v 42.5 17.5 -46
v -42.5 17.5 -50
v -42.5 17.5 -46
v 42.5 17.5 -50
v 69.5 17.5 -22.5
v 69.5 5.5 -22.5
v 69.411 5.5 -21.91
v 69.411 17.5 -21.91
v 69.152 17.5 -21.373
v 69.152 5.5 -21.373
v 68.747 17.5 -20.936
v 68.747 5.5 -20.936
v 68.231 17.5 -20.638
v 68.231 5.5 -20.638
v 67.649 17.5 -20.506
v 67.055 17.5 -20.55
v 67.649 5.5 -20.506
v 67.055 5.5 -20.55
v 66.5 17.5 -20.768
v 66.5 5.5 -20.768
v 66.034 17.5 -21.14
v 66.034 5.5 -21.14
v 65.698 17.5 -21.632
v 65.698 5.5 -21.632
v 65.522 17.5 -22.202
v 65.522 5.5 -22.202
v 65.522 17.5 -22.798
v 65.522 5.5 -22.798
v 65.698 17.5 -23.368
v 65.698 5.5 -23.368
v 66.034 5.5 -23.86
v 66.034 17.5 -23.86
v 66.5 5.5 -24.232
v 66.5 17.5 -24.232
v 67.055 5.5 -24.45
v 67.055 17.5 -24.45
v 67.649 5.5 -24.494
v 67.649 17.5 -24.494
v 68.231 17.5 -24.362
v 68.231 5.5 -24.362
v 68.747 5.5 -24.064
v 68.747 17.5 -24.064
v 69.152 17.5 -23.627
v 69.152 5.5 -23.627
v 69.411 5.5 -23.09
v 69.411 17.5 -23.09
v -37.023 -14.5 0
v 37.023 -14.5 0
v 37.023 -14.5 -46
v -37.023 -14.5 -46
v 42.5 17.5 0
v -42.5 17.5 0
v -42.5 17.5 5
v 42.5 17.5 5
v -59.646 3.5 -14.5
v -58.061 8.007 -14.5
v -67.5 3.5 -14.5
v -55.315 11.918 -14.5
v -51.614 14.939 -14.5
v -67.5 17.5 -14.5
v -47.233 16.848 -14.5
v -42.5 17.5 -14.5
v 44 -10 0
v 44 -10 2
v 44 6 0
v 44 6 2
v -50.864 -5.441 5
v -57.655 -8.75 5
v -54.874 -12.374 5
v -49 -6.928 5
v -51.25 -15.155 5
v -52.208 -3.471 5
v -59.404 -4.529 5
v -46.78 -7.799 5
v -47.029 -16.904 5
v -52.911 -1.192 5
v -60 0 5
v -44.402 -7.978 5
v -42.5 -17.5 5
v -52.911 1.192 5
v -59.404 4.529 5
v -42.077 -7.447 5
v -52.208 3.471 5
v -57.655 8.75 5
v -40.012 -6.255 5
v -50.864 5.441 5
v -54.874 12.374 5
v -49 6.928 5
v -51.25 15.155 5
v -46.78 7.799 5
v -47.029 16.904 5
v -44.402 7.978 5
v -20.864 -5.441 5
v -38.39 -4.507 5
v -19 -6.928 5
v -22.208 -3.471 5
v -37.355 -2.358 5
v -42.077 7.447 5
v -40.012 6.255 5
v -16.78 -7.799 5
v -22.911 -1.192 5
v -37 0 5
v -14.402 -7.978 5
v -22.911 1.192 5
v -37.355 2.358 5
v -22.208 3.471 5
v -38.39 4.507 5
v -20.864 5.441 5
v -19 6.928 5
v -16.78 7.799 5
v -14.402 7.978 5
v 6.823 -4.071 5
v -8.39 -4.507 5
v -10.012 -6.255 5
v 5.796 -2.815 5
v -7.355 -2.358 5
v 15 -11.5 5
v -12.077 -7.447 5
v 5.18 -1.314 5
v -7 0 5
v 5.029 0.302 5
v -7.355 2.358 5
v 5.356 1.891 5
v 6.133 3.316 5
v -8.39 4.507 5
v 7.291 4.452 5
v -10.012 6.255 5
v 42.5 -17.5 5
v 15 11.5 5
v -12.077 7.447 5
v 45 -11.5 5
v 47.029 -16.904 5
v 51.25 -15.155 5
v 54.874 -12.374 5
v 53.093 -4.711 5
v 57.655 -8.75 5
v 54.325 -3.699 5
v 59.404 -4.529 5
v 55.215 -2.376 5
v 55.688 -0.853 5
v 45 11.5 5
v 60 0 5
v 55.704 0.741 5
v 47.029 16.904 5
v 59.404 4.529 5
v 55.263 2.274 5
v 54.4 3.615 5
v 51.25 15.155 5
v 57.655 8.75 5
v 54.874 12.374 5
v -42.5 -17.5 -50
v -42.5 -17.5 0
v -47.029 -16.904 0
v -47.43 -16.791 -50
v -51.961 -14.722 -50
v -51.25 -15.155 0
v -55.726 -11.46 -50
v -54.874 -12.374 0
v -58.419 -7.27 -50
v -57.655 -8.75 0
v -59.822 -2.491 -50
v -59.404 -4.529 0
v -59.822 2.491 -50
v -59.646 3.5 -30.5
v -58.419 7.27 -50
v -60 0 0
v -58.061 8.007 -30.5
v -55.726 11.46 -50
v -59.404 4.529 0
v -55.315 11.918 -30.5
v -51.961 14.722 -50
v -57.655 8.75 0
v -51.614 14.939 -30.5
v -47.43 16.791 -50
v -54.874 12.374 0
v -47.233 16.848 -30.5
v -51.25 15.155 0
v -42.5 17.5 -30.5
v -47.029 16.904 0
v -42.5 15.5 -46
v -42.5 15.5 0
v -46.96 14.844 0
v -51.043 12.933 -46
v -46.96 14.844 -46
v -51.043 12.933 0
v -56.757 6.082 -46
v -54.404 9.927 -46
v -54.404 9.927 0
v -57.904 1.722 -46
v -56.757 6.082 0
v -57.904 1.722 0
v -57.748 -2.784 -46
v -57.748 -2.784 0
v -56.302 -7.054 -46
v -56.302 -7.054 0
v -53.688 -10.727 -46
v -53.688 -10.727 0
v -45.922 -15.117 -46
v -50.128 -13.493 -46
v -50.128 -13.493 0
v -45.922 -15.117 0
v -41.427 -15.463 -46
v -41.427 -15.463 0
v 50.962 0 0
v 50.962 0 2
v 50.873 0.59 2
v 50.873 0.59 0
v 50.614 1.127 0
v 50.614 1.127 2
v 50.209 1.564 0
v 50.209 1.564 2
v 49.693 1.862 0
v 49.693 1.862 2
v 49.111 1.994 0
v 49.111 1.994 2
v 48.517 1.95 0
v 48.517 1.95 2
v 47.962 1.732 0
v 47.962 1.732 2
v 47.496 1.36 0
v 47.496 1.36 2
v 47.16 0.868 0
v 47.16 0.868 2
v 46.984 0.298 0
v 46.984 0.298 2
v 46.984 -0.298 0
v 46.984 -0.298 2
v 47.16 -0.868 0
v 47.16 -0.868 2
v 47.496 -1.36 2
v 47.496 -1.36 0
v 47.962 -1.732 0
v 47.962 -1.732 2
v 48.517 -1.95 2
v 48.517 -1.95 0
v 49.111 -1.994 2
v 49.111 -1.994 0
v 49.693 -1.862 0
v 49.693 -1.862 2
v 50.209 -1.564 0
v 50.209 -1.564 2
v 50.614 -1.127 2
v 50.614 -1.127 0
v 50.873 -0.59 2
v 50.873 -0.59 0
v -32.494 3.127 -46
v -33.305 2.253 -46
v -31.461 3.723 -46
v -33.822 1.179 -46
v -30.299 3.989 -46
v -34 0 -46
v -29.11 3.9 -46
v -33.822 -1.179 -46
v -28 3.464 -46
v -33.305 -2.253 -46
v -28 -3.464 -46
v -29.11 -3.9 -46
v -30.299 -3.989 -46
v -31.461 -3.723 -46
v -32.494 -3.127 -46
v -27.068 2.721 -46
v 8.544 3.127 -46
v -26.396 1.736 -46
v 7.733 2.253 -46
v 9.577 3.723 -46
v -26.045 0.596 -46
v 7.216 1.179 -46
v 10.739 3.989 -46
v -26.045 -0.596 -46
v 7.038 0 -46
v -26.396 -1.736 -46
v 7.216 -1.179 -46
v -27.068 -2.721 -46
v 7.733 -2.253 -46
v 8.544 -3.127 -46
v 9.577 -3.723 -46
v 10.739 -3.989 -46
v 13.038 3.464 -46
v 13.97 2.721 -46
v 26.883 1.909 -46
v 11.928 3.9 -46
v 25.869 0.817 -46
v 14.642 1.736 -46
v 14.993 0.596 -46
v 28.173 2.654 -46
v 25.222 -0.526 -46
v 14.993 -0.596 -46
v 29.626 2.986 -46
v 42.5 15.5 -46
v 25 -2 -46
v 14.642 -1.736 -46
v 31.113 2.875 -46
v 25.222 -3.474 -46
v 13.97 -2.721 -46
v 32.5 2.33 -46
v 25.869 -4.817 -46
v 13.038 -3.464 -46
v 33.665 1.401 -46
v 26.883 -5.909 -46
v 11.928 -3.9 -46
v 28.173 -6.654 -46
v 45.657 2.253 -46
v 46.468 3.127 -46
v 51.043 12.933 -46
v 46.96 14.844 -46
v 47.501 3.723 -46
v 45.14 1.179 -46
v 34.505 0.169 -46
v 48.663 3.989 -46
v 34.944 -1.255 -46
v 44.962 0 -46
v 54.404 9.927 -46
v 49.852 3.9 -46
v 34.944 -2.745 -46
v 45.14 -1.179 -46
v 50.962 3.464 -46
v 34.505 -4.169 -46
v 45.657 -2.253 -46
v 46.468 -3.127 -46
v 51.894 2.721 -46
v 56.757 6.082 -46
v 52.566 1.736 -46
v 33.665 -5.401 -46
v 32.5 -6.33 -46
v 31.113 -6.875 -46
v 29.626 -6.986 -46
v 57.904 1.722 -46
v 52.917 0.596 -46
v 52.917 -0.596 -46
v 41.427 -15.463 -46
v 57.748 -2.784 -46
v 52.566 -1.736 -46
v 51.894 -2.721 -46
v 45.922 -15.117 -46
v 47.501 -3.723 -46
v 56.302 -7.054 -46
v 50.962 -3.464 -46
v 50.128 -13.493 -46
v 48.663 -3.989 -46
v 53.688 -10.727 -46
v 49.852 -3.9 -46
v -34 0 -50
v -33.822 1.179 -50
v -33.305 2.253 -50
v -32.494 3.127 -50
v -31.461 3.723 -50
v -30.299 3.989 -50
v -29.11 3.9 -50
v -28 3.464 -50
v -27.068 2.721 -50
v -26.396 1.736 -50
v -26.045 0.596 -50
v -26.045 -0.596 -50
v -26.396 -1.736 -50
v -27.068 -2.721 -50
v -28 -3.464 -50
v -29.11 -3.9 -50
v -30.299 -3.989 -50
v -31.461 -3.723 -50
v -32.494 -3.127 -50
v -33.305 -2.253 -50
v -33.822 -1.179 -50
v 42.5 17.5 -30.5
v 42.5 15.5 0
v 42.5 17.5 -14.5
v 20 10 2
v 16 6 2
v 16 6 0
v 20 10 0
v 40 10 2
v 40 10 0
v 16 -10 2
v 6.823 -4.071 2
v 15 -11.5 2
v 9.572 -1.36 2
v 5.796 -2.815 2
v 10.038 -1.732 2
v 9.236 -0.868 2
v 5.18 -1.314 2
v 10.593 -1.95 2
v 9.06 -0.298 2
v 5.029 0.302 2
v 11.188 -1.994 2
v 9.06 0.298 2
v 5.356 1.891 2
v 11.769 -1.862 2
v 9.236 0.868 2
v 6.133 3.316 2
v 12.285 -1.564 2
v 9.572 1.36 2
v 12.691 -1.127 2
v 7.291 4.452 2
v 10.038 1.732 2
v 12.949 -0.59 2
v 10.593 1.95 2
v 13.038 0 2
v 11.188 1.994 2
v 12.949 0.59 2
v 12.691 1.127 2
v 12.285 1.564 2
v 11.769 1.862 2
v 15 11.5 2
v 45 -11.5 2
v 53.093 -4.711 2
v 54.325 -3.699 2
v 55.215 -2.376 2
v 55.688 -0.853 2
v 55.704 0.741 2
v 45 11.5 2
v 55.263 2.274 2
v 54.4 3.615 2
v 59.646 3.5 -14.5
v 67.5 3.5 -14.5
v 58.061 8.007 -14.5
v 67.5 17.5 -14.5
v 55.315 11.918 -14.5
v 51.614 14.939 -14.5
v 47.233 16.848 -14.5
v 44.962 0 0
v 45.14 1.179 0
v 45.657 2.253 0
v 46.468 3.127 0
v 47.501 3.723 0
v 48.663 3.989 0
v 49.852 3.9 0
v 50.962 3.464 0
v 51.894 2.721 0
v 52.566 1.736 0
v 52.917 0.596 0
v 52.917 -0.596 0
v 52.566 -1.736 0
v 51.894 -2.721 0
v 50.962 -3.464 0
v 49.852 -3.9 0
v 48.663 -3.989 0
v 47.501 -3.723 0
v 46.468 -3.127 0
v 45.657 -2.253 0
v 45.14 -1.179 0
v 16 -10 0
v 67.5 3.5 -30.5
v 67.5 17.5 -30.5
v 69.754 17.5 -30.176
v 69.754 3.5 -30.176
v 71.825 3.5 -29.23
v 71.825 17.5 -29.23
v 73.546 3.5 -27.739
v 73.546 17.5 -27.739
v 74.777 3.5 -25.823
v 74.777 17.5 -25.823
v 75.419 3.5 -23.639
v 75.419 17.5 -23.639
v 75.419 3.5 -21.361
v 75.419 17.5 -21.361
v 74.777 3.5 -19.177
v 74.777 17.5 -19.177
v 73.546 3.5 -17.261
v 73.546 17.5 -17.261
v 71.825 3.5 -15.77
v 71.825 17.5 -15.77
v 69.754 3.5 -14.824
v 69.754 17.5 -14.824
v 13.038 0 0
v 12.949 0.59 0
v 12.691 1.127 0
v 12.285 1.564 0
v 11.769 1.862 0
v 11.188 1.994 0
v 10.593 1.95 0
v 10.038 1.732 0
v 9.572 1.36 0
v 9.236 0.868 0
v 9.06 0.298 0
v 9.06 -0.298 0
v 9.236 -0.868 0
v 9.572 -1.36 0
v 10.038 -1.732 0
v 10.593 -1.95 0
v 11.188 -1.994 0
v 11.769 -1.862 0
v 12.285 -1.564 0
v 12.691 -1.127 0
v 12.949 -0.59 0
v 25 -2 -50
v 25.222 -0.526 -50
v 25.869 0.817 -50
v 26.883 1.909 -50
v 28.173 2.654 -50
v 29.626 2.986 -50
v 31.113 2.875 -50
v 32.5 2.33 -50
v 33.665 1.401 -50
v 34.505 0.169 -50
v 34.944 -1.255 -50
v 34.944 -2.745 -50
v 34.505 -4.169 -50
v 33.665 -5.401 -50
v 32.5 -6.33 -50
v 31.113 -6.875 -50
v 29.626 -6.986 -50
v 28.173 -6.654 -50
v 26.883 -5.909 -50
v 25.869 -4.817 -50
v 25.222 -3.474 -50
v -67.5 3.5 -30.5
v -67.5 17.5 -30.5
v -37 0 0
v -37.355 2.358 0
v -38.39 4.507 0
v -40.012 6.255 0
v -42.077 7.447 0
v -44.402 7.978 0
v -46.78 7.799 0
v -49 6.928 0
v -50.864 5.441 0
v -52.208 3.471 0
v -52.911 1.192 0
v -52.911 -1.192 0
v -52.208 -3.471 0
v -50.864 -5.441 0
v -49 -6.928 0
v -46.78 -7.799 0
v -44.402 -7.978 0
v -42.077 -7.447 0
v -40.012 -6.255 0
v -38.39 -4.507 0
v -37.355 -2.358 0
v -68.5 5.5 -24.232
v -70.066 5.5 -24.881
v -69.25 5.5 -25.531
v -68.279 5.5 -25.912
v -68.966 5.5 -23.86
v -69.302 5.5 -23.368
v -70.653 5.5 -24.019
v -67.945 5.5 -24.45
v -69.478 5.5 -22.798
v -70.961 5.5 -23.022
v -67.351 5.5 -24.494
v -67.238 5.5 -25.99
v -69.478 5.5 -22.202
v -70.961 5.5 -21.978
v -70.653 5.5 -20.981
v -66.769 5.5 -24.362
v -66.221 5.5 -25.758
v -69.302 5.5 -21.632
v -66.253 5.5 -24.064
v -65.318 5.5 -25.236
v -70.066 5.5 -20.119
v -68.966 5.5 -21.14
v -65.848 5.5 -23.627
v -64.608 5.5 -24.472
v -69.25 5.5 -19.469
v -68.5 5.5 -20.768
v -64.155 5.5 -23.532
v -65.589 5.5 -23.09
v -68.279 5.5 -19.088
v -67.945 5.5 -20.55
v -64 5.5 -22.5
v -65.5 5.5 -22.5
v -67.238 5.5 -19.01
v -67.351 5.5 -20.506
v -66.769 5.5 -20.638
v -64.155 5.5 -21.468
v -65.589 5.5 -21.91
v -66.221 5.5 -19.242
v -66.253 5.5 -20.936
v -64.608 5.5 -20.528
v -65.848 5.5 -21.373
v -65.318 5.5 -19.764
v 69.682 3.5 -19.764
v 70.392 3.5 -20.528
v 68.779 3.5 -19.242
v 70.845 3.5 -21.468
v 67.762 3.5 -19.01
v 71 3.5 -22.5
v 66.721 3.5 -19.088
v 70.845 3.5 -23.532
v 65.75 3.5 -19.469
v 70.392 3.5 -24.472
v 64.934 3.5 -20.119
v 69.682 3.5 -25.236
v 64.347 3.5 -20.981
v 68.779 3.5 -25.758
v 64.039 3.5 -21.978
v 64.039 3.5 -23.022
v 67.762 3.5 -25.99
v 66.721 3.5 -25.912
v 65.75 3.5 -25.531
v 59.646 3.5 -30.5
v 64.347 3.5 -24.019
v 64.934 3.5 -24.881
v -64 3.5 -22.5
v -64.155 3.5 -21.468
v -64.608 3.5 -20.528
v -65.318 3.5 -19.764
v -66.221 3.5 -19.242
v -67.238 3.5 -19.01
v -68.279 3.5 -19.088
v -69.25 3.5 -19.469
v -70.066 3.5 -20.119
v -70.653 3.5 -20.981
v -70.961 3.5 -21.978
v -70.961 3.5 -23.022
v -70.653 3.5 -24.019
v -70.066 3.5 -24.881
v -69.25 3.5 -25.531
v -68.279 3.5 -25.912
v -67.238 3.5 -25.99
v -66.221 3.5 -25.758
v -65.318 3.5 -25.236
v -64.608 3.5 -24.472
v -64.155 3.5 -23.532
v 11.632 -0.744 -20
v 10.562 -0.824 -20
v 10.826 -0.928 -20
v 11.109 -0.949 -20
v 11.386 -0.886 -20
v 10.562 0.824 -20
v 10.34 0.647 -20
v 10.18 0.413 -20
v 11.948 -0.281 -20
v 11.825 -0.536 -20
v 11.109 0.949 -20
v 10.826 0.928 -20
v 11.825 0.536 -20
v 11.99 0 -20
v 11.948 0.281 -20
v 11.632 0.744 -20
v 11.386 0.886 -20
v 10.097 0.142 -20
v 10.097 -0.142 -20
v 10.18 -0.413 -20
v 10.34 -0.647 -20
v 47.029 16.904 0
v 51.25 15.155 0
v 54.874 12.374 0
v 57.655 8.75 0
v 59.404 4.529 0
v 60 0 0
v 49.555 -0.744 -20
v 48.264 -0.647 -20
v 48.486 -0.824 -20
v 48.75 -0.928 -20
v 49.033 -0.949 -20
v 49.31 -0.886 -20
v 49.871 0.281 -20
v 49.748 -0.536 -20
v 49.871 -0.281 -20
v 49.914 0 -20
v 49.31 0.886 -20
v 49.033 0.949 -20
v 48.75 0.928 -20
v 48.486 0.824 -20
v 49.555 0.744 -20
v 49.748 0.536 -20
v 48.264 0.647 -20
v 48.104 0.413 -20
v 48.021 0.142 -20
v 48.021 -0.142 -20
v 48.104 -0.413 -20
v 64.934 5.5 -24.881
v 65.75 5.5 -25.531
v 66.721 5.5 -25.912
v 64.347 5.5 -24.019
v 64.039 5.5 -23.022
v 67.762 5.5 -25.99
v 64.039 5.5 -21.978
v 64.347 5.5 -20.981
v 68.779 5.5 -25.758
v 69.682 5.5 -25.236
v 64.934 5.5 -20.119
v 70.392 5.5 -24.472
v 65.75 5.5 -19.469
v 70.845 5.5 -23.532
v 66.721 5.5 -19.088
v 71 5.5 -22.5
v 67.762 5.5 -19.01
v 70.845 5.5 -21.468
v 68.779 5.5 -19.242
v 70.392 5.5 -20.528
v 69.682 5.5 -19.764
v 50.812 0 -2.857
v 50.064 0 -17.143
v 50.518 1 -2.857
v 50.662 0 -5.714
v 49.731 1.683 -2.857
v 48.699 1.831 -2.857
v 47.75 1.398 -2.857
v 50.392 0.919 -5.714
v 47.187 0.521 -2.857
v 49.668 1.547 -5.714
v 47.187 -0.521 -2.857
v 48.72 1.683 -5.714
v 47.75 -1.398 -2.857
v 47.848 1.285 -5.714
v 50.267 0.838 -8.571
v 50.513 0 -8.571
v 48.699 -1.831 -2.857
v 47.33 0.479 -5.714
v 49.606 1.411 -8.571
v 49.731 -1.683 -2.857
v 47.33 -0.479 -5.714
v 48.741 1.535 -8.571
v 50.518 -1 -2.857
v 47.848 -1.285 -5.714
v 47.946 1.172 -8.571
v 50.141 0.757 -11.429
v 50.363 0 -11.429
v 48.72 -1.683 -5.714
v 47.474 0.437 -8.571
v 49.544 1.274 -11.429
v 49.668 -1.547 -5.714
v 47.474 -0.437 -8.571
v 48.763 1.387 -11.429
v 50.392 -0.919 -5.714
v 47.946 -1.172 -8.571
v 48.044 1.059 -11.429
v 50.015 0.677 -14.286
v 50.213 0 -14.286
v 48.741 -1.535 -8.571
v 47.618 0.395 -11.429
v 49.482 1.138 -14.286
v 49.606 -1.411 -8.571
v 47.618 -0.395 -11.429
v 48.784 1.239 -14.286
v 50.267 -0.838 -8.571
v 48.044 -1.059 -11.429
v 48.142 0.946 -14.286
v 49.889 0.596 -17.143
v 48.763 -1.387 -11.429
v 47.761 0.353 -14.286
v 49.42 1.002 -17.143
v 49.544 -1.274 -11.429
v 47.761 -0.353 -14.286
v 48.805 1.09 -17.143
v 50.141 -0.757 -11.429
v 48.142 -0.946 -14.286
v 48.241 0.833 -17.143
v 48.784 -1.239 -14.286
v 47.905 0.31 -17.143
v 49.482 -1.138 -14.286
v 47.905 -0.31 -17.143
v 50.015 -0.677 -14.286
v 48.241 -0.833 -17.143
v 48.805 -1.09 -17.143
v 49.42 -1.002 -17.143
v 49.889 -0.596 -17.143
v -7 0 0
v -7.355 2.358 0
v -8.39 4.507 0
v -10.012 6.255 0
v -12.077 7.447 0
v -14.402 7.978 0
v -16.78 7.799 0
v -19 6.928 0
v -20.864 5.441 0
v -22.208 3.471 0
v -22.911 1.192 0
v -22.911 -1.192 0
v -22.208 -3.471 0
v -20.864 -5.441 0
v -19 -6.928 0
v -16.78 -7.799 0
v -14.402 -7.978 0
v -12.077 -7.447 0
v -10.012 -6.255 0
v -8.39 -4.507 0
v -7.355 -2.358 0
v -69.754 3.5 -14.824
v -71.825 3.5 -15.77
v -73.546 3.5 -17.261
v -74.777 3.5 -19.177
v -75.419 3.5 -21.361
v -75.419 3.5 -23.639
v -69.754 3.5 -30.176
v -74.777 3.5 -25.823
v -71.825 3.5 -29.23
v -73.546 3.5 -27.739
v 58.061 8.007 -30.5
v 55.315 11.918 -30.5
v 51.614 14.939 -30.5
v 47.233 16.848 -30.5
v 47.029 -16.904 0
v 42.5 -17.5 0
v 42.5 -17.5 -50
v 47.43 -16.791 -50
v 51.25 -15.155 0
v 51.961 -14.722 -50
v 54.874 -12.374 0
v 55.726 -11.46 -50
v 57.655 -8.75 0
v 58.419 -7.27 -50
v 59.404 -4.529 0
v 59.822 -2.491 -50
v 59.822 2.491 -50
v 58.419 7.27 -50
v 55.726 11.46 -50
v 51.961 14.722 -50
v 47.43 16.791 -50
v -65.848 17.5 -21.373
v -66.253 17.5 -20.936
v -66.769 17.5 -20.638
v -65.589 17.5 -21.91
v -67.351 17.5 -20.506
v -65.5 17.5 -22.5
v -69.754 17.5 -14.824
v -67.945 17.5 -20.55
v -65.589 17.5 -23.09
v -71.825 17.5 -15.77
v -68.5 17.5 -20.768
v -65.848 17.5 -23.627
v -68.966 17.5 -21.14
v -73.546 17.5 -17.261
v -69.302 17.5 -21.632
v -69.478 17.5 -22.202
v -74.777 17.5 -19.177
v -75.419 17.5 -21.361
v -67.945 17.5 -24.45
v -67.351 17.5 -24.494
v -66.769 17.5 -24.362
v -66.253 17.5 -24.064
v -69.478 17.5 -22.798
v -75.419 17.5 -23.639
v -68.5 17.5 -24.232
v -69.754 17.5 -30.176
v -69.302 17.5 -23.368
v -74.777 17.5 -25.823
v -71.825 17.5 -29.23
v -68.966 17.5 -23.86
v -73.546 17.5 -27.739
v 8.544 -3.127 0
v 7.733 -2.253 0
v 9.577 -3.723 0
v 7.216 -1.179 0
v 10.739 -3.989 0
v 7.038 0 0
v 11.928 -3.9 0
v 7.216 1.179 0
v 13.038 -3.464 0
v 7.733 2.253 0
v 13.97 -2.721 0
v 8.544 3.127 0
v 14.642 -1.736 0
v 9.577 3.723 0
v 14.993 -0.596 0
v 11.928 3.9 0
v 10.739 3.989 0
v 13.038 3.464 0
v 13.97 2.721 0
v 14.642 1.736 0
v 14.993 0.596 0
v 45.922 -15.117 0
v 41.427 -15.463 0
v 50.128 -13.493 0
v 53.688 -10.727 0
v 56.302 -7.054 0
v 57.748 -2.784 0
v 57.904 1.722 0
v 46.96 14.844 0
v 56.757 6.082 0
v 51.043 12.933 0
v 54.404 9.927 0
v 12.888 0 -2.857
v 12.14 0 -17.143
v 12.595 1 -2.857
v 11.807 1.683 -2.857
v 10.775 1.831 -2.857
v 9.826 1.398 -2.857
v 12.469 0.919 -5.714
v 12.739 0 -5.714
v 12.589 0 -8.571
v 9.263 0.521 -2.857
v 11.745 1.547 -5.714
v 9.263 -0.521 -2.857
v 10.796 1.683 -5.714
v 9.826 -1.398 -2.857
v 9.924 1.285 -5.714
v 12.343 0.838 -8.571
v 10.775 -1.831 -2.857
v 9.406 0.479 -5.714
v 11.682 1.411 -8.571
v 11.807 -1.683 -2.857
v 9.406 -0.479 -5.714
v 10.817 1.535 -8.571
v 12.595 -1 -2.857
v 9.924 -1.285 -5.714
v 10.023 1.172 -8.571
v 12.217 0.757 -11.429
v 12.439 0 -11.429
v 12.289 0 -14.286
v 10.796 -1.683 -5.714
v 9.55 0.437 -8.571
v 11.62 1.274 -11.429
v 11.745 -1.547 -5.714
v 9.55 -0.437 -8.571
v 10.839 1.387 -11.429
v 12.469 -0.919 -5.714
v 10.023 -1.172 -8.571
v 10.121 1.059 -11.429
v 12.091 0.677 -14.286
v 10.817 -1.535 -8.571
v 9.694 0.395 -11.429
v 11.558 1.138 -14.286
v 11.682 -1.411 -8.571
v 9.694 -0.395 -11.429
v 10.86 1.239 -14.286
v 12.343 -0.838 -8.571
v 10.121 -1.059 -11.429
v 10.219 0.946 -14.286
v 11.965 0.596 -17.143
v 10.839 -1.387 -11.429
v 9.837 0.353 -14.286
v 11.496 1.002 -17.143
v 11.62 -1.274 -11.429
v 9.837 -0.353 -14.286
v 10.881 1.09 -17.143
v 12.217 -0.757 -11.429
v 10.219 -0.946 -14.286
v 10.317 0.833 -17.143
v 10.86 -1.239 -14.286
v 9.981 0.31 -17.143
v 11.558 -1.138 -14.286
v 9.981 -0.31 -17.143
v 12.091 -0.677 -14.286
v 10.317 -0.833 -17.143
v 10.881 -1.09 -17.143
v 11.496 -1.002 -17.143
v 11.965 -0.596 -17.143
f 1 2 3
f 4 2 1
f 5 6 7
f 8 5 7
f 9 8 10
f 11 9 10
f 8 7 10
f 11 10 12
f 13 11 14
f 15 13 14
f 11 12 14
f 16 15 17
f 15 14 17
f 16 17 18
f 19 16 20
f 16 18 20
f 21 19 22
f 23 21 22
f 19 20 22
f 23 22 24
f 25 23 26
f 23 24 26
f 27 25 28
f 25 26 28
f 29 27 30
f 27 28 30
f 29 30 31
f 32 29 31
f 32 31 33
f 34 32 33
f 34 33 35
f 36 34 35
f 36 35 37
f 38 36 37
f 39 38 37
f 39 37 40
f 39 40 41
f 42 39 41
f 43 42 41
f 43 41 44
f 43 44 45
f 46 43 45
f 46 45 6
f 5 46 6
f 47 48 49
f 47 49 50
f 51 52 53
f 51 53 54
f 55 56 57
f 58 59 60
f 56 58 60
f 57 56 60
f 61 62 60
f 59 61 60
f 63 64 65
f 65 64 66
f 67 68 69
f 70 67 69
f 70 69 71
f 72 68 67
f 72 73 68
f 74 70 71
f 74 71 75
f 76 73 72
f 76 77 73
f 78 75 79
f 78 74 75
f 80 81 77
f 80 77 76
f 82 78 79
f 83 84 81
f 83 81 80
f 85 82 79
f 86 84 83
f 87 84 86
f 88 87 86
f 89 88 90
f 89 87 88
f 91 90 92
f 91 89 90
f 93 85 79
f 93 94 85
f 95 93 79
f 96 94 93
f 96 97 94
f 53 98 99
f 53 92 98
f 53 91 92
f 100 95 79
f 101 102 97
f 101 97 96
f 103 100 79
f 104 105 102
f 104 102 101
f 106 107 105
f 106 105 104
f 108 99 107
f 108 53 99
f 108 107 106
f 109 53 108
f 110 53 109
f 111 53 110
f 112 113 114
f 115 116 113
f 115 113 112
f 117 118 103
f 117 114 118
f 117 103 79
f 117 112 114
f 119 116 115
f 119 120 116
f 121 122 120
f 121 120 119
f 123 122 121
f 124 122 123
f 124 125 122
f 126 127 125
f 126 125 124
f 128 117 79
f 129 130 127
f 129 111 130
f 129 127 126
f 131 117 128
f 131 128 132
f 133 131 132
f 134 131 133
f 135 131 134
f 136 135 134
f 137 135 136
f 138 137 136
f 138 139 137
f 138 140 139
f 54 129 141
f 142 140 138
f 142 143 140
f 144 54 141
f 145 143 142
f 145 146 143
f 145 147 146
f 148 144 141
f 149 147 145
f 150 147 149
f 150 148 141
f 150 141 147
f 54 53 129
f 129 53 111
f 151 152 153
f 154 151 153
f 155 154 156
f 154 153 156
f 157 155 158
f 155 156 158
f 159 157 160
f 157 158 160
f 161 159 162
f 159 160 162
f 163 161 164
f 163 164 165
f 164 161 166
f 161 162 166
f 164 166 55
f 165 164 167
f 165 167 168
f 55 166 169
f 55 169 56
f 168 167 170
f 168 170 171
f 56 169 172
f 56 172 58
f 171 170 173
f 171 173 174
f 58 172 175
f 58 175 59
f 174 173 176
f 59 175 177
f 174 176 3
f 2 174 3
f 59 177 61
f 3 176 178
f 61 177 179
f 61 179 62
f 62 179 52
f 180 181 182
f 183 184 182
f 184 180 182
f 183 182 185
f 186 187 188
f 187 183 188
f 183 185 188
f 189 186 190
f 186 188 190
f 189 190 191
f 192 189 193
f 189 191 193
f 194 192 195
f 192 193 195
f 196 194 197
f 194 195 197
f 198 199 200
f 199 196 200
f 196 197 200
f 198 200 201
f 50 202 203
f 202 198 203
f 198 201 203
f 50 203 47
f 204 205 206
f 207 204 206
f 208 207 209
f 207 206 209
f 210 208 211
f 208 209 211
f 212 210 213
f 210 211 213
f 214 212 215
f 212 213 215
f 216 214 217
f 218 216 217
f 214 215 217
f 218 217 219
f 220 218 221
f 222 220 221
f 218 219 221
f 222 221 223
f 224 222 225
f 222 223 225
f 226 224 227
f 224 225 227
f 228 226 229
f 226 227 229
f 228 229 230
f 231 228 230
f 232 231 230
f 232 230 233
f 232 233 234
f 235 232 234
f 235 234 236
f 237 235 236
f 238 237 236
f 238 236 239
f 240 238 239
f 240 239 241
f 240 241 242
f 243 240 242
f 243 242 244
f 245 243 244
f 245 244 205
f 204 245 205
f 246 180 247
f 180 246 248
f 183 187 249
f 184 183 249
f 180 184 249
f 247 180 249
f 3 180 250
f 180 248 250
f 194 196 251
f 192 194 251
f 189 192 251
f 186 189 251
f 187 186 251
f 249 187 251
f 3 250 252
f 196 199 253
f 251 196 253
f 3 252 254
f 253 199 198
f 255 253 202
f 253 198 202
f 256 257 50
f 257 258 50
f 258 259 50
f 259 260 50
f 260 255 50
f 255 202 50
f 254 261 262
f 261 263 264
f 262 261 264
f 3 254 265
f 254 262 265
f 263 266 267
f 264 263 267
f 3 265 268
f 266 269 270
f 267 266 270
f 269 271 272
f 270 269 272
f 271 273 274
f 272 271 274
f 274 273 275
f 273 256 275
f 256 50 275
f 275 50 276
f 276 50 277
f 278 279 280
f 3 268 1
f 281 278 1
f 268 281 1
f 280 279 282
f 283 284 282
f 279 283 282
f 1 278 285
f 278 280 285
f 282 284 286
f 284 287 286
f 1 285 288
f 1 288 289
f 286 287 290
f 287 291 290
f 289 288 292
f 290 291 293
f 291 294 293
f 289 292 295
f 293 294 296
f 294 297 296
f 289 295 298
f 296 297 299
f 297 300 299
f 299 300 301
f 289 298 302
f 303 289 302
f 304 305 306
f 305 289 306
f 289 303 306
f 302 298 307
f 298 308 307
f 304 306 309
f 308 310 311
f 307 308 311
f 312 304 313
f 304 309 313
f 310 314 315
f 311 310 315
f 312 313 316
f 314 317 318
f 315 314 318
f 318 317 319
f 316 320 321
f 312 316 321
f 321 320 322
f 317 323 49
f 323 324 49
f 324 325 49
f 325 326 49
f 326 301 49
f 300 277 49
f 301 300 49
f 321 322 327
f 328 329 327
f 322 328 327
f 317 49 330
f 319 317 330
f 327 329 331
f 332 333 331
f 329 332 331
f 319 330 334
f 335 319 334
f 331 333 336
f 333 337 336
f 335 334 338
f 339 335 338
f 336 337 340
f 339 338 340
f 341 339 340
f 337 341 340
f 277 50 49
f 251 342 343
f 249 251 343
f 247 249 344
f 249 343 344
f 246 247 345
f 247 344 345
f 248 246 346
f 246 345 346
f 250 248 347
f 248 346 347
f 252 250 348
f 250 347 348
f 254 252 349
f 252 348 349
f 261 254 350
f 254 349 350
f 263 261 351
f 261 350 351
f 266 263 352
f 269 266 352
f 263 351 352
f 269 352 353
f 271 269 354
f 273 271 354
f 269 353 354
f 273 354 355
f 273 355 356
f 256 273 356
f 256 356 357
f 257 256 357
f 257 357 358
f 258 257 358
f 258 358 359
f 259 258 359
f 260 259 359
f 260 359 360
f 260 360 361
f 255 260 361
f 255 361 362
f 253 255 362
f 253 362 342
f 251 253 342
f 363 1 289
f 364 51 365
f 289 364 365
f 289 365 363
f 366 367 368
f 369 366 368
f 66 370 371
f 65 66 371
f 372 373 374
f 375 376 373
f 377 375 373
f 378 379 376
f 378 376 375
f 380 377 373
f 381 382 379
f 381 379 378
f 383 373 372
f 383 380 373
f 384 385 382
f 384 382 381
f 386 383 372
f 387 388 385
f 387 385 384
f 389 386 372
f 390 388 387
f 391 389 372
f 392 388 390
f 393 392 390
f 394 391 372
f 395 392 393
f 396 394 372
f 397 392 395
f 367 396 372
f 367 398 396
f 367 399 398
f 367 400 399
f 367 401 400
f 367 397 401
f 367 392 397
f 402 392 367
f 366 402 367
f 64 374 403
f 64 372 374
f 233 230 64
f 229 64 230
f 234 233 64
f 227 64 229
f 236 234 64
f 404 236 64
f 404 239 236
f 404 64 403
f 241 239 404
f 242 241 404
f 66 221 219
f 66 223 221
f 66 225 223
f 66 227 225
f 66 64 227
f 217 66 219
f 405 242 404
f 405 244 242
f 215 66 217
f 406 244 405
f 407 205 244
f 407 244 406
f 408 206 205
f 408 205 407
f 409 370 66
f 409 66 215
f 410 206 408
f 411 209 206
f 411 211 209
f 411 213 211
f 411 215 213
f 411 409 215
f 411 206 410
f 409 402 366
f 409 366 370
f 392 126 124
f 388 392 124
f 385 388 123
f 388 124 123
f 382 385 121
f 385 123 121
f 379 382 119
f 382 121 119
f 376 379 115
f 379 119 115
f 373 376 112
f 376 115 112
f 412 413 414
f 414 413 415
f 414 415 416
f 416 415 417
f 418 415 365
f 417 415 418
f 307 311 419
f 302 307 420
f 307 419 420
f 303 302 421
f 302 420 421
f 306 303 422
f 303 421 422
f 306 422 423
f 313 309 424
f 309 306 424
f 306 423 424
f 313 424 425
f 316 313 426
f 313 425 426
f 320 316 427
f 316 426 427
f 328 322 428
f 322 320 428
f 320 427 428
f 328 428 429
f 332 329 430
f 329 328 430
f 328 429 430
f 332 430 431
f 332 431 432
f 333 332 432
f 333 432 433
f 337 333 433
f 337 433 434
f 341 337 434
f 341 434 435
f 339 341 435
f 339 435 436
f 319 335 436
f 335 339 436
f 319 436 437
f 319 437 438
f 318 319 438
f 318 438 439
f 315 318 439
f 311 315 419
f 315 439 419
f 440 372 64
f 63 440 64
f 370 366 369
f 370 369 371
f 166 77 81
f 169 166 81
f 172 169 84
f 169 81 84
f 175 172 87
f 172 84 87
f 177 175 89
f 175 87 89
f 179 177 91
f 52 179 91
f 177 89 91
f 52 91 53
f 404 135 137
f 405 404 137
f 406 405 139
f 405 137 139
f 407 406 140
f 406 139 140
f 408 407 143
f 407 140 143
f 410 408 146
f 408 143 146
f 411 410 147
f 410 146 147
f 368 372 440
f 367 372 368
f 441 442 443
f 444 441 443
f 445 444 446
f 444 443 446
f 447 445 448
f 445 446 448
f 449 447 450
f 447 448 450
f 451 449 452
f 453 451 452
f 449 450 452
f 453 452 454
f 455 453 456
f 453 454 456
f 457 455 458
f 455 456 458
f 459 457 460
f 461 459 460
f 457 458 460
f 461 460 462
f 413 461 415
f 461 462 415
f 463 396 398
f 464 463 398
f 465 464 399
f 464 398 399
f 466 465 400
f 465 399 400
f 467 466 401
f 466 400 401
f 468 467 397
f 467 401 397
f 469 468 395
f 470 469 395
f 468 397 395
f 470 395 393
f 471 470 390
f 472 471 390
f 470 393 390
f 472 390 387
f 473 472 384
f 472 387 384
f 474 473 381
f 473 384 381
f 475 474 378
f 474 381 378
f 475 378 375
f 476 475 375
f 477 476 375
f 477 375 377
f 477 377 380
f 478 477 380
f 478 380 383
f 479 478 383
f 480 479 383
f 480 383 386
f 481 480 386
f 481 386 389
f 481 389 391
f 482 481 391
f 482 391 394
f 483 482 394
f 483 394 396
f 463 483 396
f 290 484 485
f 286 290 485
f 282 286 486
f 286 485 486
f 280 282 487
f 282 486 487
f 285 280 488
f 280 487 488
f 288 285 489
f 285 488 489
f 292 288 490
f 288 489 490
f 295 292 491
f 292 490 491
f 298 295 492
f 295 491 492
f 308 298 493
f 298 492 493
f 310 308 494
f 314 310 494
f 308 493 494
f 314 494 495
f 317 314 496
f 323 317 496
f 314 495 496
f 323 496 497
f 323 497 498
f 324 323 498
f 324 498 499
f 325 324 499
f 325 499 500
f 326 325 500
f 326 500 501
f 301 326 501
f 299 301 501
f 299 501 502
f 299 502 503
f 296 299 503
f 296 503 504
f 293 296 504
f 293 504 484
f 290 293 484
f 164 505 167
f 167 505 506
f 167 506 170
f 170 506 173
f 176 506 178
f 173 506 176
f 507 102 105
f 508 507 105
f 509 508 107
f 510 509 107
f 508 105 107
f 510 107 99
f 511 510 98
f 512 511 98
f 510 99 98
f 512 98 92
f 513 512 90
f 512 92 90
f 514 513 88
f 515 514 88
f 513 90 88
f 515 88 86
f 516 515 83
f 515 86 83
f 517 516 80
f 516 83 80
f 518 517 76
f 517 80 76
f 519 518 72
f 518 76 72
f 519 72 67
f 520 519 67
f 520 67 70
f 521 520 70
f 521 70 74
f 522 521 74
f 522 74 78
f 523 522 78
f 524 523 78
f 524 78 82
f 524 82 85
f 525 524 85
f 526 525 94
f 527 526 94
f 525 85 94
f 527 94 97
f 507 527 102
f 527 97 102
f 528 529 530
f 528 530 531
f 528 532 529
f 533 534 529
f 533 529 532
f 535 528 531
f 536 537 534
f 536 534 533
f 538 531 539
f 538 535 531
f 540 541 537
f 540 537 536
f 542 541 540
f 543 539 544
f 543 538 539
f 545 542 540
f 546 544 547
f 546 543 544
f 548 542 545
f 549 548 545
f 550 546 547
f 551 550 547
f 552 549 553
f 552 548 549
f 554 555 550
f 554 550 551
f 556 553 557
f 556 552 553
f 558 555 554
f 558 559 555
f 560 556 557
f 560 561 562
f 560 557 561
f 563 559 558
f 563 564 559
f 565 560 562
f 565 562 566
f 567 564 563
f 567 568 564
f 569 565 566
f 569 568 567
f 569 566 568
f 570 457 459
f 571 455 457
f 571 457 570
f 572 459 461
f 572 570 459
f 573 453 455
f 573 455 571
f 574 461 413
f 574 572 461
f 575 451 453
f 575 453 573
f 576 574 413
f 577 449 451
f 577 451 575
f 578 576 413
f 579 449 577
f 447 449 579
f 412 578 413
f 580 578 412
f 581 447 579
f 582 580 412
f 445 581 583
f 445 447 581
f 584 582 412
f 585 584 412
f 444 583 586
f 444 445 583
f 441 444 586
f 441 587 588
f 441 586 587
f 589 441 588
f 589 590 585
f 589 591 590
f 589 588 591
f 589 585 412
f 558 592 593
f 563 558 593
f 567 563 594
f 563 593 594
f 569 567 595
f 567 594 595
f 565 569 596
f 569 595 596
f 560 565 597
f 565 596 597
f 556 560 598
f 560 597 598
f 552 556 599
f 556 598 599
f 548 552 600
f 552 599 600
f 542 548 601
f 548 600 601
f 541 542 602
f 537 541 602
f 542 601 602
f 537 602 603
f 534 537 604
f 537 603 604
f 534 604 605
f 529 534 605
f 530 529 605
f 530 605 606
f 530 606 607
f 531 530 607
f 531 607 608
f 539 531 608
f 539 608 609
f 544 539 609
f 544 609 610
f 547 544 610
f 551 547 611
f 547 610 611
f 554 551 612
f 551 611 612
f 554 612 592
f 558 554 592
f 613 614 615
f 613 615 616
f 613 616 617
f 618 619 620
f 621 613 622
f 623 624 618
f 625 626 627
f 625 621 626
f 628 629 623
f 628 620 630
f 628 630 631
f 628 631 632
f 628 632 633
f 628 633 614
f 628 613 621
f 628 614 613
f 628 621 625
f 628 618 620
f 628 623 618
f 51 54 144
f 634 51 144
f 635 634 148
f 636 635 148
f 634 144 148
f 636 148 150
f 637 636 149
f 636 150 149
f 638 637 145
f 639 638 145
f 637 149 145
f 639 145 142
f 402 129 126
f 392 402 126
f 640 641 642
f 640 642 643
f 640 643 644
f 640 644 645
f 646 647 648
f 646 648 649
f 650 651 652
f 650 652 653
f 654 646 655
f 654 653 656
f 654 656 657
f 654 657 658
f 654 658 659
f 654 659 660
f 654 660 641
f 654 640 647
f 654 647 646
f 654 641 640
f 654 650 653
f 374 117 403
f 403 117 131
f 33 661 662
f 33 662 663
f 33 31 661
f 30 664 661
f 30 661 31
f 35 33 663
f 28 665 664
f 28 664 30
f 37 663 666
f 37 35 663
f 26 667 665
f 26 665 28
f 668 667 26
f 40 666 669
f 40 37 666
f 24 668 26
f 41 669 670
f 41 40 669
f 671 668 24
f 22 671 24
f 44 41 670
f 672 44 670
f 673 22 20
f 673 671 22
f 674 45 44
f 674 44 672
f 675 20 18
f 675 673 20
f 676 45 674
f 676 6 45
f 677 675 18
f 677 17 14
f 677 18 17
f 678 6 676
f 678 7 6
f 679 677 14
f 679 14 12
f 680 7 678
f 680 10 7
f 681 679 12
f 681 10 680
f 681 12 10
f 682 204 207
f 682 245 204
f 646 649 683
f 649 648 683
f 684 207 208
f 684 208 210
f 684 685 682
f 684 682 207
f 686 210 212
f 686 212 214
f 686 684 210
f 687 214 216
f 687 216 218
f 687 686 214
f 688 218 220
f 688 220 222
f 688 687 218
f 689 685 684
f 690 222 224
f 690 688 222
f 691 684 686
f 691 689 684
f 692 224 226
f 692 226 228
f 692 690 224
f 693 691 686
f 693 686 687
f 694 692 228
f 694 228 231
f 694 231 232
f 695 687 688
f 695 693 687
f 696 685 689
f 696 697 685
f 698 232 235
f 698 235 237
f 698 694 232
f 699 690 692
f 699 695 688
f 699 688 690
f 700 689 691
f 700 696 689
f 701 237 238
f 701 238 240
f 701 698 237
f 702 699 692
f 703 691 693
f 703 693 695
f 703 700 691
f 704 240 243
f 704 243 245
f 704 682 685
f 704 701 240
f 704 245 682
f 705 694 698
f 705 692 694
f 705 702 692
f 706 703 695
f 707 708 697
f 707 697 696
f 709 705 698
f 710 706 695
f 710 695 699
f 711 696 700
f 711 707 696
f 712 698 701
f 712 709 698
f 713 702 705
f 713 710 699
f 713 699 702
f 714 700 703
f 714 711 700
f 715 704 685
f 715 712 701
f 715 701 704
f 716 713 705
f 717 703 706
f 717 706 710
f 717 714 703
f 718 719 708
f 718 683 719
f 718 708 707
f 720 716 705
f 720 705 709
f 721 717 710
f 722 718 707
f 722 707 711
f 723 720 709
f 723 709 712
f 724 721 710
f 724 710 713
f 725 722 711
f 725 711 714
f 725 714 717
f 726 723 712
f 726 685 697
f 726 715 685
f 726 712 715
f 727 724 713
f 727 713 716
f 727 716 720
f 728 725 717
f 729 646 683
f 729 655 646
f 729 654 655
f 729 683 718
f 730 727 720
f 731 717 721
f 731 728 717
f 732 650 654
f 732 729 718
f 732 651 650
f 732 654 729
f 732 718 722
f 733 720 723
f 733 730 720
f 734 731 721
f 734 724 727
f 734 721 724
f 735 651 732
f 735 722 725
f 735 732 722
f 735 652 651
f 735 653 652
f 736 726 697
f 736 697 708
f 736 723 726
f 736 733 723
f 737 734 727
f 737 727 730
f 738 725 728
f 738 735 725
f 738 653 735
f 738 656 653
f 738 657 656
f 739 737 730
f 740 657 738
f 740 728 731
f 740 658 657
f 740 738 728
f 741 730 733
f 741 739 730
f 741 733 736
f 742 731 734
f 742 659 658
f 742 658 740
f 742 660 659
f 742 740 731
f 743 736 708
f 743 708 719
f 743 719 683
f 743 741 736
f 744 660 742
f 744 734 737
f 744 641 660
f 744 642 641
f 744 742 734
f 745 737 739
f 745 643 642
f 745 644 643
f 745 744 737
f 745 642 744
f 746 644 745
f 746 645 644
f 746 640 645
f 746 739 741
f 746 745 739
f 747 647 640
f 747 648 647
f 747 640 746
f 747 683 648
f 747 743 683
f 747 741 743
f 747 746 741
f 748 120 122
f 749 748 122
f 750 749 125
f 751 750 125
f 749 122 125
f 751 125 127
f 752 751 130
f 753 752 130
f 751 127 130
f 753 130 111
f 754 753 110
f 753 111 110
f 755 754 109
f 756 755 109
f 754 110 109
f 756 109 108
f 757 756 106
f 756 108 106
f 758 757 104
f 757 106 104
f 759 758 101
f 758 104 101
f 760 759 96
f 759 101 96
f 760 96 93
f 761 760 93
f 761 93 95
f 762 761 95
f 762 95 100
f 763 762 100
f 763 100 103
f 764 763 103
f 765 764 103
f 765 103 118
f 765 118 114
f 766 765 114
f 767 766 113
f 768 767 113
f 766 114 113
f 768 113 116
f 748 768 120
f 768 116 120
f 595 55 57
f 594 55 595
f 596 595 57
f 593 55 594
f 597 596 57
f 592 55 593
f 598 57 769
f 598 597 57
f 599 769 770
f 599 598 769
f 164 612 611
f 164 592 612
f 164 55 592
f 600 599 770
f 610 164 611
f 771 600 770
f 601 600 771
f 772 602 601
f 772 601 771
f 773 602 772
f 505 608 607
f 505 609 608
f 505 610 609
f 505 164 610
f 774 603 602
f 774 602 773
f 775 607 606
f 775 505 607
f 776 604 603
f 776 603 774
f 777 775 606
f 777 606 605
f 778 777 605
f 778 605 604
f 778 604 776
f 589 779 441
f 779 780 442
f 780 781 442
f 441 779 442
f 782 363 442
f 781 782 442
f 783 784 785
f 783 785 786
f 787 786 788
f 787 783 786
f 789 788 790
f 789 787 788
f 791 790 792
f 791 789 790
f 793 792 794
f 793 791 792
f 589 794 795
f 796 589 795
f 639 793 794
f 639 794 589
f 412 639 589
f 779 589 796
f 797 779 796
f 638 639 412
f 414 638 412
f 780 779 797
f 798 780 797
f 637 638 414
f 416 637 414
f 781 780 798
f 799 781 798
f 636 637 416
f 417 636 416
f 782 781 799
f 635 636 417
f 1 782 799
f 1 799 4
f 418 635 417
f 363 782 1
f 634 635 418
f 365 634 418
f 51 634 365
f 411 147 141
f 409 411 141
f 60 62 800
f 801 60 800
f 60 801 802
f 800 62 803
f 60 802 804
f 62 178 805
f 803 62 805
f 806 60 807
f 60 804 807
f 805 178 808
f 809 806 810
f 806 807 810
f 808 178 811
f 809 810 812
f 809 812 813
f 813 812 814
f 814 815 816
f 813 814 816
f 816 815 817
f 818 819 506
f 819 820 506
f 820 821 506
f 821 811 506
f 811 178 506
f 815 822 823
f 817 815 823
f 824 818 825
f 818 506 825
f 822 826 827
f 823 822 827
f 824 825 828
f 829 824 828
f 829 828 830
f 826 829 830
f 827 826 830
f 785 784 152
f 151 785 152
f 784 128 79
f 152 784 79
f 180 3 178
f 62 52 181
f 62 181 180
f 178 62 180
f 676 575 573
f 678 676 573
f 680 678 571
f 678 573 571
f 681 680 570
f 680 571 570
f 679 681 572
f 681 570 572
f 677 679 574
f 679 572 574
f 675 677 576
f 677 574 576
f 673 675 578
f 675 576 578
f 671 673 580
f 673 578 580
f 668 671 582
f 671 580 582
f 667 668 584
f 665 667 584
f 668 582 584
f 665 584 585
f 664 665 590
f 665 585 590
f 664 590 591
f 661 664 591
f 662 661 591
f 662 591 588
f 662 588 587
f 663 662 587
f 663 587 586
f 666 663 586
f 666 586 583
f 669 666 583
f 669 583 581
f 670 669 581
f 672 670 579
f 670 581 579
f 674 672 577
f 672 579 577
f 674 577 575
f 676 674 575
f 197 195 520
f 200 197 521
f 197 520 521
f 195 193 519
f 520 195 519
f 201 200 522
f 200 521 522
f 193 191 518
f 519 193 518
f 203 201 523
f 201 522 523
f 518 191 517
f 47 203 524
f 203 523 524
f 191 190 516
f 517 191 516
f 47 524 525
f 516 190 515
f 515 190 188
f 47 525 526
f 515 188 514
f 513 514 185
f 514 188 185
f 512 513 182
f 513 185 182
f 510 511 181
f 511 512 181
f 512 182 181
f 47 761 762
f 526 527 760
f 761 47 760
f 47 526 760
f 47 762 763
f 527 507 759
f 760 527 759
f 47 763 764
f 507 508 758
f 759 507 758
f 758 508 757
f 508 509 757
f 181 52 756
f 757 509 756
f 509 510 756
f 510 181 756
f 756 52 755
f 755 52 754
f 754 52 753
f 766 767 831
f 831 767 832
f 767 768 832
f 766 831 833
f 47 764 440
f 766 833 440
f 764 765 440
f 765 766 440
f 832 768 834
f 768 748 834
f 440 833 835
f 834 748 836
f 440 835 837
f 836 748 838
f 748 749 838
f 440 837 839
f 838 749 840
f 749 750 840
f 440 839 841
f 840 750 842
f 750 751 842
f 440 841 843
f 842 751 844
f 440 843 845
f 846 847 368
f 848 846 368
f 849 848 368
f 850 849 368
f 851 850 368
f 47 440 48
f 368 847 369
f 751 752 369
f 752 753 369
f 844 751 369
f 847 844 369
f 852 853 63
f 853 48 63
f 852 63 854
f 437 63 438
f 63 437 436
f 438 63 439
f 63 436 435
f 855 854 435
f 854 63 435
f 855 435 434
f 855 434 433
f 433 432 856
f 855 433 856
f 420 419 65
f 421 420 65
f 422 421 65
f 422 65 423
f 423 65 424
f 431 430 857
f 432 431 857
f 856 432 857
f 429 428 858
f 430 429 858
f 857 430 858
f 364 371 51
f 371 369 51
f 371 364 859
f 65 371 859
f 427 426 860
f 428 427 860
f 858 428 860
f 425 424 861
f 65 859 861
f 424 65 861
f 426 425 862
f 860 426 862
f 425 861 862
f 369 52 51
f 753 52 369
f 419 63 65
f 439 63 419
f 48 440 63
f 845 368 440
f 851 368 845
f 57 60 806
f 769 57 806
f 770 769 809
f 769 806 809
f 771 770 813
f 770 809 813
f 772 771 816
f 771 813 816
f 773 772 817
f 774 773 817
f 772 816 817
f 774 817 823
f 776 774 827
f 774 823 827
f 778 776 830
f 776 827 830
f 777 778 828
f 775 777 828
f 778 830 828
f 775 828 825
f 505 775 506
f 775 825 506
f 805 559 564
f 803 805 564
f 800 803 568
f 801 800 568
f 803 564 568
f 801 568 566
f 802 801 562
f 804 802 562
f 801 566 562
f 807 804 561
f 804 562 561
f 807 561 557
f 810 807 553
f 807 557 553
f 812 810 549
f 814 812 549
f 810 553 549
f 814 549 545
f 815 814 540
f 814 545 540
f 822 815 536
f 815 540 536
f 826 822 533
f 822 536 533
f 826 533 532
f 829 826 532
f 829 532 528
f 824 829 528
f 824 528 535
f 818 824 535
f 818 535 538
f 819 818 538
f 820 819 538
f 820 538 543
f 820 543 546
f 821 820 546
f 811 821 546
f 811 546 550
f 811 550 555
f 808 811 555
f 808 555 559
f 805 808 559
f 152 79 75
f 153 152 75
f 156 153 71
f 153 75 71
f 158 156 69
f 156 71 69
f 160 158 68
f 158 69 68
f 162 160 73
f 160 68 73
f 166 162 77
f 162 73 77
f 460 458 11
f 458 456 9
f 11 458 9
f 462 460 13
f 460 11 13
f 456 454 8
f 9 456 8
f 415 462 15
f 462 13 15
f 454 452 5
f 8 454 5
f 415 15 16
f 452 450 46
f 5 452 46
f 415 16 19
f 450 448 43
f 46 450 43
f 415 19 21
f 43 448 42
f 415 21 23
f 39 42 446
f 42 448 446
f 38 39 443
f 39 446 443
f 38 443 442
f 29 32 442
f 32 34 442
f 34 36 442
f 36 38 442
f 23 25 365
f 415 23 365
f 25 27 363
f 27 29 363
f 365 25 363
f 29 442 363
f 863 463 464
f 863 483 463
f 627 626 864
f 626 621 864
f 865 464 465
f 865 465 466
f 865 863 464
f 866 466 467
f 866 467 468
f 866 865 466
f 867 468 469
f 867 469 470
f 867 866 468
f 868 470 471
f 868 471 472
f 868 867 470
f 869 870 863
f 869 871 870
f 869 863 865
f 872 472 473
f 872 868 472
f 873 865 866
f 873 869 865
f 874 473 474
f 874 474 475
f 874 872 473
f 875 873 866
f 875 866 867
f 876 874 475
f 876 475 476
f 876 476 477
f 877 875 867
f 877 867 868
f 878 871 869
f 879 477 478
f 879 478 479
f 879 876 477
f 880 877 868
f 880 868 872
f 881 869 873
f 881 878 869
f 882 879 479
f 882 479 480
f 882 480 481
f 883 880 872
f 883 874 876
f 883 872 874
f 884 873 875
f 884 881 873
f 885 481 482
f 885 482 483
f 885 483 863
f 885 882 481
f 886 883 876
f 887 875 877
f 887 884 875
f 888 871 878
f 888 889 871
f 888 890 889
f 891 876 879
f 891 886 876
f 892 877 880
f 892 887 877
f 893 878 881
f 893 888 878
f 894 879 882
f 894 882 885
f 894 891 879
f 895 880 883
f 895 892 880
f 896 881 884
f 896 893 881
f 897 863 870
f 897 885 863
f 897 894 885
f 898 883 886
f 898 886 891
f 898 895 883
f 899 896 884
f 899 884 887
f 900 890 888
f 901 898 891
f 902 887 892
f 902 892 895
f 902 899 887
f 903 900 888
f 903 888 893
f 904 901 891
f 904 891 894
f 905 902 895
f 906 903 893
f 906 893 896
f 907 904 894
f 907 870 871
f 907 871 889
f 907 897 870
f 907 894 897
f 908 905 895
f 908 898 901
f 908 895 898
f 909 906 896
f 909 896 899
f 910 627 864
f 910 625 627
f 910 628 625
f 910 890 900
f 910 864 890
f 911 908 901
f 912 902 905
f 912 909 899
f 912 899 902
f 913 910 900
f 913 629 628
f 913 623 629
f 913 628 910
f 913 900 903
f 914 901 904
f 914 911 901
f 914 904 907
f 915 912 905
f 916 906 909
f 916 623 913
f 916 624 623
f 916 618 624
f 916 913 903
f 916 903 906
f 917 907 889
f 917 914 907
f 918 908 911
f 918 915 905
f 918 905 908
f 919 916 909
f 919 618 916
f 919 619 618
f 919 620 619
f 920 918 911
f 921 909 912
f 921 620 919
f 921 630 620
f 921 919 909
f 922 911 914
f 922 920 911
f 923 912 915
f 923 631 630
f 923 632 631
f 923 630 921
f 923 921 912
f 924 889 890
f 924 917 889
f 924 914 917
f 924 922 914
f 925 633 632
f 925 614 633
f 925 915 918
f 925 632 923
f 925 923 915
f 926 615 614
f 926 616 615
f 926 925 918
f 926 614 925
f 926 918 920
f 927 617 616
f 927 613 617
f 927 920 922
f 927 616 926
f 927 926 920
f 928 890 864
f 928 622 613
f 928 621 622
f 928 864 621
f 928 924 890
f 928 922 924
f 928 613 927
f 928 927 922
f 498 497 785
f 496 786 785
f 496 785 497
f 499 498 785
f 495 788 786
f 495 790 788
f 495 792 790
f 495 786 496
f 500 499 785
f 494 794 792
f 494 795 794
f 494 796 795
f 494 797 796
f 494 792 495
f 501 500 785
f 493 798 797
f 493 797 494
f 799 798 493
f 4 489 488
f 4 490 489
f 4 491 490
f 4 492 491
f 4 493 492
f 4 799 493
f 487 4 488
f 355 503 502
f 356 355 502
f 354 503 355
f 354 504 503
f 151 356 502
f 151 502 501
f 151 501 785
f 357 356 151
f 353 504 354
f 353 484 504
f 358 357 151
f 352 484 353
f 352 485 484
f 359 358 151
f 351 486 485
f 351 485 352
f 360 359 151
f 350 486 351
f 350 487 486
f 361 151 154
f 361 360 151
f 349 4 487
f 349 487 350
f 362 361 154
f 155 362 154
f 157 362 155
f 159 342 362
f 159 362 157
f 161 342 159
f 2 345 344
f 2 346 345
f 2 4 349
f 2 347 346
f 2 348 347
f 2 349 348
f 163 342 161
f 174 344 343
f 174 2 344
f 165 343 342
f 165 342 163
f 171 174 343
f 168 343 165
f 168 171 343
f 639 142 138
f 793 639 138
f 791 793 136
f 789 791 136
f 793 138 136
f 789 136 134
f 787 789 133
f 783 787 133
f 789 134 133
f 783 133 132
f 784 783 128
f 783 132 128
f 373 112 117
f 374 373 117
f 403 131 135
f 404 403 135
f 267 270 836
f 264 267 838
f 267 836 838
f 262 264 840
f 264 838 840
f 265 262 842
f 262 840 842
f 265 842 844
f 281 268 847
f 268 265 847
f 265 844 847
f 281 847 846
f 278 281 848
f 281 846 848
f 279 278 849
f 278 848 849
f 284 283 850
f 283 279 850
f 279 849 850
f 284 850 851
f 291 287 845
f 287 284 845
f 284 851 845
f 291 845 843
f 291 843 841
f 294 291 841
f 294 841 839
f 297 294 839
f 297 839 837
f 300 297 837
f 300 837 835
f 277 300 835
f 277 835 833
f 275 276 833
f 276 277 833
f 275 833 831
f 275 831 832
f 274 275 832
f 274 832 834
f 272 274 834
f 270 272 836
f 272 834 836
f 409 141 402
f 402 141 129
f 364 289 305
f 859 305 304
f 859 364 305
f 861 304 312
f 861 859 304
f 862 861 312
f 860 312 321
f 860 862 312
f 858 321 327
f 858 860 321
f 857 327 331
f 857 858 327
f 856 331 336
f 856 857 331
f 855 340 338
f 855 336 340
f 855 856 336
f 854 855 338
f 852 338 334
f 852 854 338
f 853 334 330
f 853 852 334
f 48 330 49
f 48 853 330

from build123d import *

# Parameters (mm, degrees)
SKETCH1_W           = 120
SKETCH1_H           = 35
BOSS_EXTRUDE1_DEPTH = 5
CUT_EXTRUDE1_DEPTH  = 3
SKETCH5_W           = 28
SKETCH5_H           = 20
CUT_EXTRUDE2_DEPTH  = 3
CHAMFER1_SIZE       = 4
SKETCH6_R           = 8
CUT_EXTRUDE3_DEPTH  = 5
SKETCH7_R           = 2
CUT_EXTRUDE4_DEPTH  = 5
CUT_EXTRUDE5_DEPTH  = 5
SKETCH9_W           = 85
SKETCH9_H           = 3
BOSS_EXTRUDE2_DEPTH = 50
SKETCH10_W          = 85
SKETCH10_H          = 4
BOSS_EXTRUDE3_DEPTH = 32
BOSS_EXTRUDE4_DEPTH = 50
SKETCH12_R          = 17.5
BOSS_EXTRUDE5_DEPTH = 4
SKETCH13_R          = 5
SKETCH13_R_2        = 4
CUT_EXTRUDE6_DEPTH  = 4
BOSS_EXTRUDE6_DEPTH = 14
SKETCH15_R          = 15.5
CUT_EXTRUDE7_DEPTH  = 46
SKETCH16_R          = 3.5
CUT_EXTRUDE8_DEPTH  = 2
SKETCH17_R          = 2
CUT_EXTRUDE9_DEPTH  = 15
BOSS_EXTRUDE7_REACH = 52
SKETCH18_R          = 4
SKETCH19_R          = 2
CUT_EXTRUDE10_DEPTH = 20
CUT_EXTRUDE10_TAPER = 3


with BuildPart() as part:
    # Sketch1 → Boss-Extrude1 (new body)
    with BuildSketch(Plane.XY):
        Rectangle(SKETCH1_W, SKETCH1_H)
    extrude(amount=BOSS_EXTRUDE1_DEPTH)

    # Sketch4 → Cut-Extrude1 (cut)
    with BuildSketch(Plane.XY.offset(5)):
        with BuildLine():
            Line((15, -11.5), (45, -11.5))
            Line((45, -11.5), (53.093205875, -4.710922816))
            ThreePointArc((53.093205875, -4.710922816), (55.688146307, -0.852928933), (54.400122175, 3.614601312))
            Line((54.400122175, 3.614601312), (45, 11.5))
            Line((45, 11.5), (15, 11.5))
            Line((15, 11.5), (7.291284487, 4.451783997))
            ThreePointArc((7.291284487, 4.451783997), (5.029380926, 0.301948581), (6.822687206, -4.07085307))
            Line((6.822687206, -4.07085307), (15, -11.5))
        make_face()
    extrude(amount=-CUT_EXTRUDE1_DEPTH, mode=Mode.SUBTRACT)

    # Sketch5 → Cut-Extrude2 (cut)
    with BuildSketch(Plane.XY.offset(2)):
        with Locations((30, 0)):
            Rectangle(SKETCH5_W, SKETCH5_H)
    extrude(amount=-CUT_EXTRUDE2_DEPTH, mode=Mode.SUBTRACT)

    # Chamfer1
    chamfer1_edges = [part.edges().sort_by_distance(p)[0] for p in [
        (44, 10, 1),
        (16, 10, 1),
    ]]
    chamfer(chamfer1_edges, length=CHAMFER1_SIZE)

    # Sketch6 → Cut-Extrude3 (cut)
    with BuildSketch(Plane.XY.offset(5)):
        with Locations((-15, 0)):
            Circle(SKETCH6_R)
        with Locations((-45, 0)):
            Circle(SKETCH6_R)
    extrude(amount=-CUT_EXTRUDE3_DEPTH, mode=Mode.SUBTRACT)

    # Sketch7 → Cut-Extrude4 (cut)
    with BuildSketch(Plane.XY.offset(2)):
        with Locations((11.038079628, 0)):
            Circle(SKETCH7_R)
        with Locations((48.961920372, 0)):
            Circle(SKETCH7_R)
    extrude(amount=-CUT_EXTRUDE4_DEPTH, mode=Mode.SUBTRACT)

    # Sketch8 → Cut-Extrude5 (cut)
    with BuildSketch(Plane.XY.offset(5)):
        with BuildLine():
            Line((-60, 17.5), (-60, -6.7e-08))
            ThreePointArc((-60, -6.7e-08), (-54.874368695, 12.374368647), (-42.5, 17.5))
            Line((-42.5, 17.5), (-60, 17.5))
        make_face()
        with BuildLine():
            Line((-60, -17.5), (-42.5, -17.5))
            ThreePointArc((-42.5, -17.5), (-54.874368647, -12.374368695), (-60, -6.7e-08))
            Line((-60, -6.7e-08), (-60, -17.5))
        make_face()
        with BuildLine():
            ThreePointArc((42.5, 17.5), (54.874368671, 12.374368671), (60, 0))
            Line((60, 0), (60, 17.5))
            Line((60, 17.5), (42.5, 17.5))
        make_face()
        with BuildLine():
            Line((42.5, -17.5), (60, -17.5))
            Line((60, -17.5), (60, 0))
            ThreePointArc((60, 0), (54.874368671, -12.374368671), (42.5, -17.5))
        make_face()
    extrude(amount=-CUT_EXTRUDE5_DEPTH, mode=Mode.SUBTRACT)

    # Sketch9 → Boss-Extrude2 (add)
    with BuildSketch(Plane(origin=(0, 0, 0), x_dir=(-1, 0, 0), z_dir=(0, 0, -1))):
        with Locations((0, -16)):
            Rectangle(SKETCH9_W, SKETCH9_H)
    extrude(amount=BOSS_EXTRUDE2_DEPTH)

    # Sketch10 → Boss-Extrude3 (add)
    with BuildSketch(Plane(origin=(0, -14.5, 0), x_dir=(1, 0, 0), z_dir=(0, 1, 0))):
        with Locations((0, 48)):
            Rectangle(SKETCH10_W, SKETCH10_H)
    extrude(amount=BOSS_EXTRUDE3_DEPTH)

    # Sketch11 → Boss-Extrude4 (add)
    with BuildSketch(Plane(origin=(0, 0, 0), x_dir=(-1, 0, 0), z_dir=(0, 0, -1))):
        with BuildLine():
            Line((42.5, 17.5), (42.5, 15.5))
            ThreePointArc((42.5, 15.5), (58, 0), (42.5, -15.5))
            Line((42.5, -15.5), (42.5, -17.5))
            ThreePointArc((42.5, -17.5), (60, 0), (42.5, 17.5))
        make_face()
        with BuildLine():
            Line((-42.5, 17.5), (-42.5, 15.5))
            ThreePointArc((-42.5, 15.5), (-58, 0), (-42.5, -15.5))
            Line((-42.5, -15.5), (-42.5, -17.5))
            ThreePointArc((-42.5, -17.5), (-60, 0), (-42.5, 17.5))
        make_face()
    extrude(amount=BOSS_EXTRUDE4_DEPTH)

    # Sketch12 → Boss-Extrude5 (add)
    with BuildSketch(Plane(origin=(0, 0, -50), x_dir=(-1, 0, 0), z_dir=(0, 0, -1))):
        with Locations((-42.5, 0)):
            Circle(SKETCH12_R)
        with Locations((42.5, 0)):
            Circle(SKETCH12_R)
    extrude(amount=-BOSS_EXTRUDE5_DEPTH)

    # Sketch13 → Cut-Extrude6 (cut)
    with BuildSketch(Plane(origin=(0, 0, -50), x_dir=(-1, 0, 0), z_dir=(0, 0, -1))):
        with Locations((-30, -2)):
            Circle(SKETCH13_R)
        with Locations((30, 0)):
            Circle(SKETCH13_R_2)
    extrude(amount=-CUT_EXTRUDE6_DEPTH, mode=Mode.SUBTRACT)

    # Sketch14 → Boss-Extrude6 (add)
    with BuildSketch(Plane(origin=(0, 17.5, 0), x_dir=(1, 0, 0), z_dir=(0, 1, 0))):
        with BuildLine():
            Line((-42.5, 14.5), (-67.5, 14.5))
            ThreePointArc((-67.5, 14.5), (-75.5, 22.5), (-67.5, 30.5))
            Line((-67.5, 30.5), (-42.5, 30.5))
            Line((-42.5, 30.5), (-42.5, 14.5))
        make_face()
        with BuildLine():
            Line((42.5, 30.5), (67.5, 30.5))
            ThreePointArc((67.5, 30.5), (75.5, 22.5), (67.5, 14.5))
            Line((67.5, 14.5), (42.5, 14.5))
            Line((42.5, 14.5), (42.5, 30.5))
        make_face()
    extrude(amount=-BOSS_EXTRUDE6_DEPTH)

    # Sketch15 → Cut-Extrude7 (cut)
    with BuildSketch(Plane(origin=(0, 0, 0), x_dir=(-1, 0, 0), z_dir=(0, 0, -1))):
        with Locations((-42.5, 0)):
            Circle(SKETCH15_R)
        with Locations((42.5, 0)):
            Circle(SKETCH15_R)
    extrude(amount=CUT_EXTRUDE7_DEPTH, mode=Mode.SUBTRACT)

    # Sketch16 → Cut-Extrude8 (cut)
    with BuildSketch(Plane.XZ.offset(-3.5)):
        with Locations((67.5, -22.5)):
            Circle(SKETCH16_R)
        with Locations((-67.5, -22.5)):
            Circle(SKETCH16_R)
    extrude(amount=-CUT_EXTRUDE8_DEPTH, mode=Mode.SUBTRACT)

    # Sketch17 → Cut-Extrude9 (cut, through all)
    with BuildSketch(Plane.XZ.offset(-3.5)):
        with Locations((-67.5, -22.5)):
            Circle(SKETCH17_R)
        with Locations((67.5, -22.5)):
            Circle(SKETCH17_R)
    extrude(amount=-CUT_EXTRUDE9_DEPTH, mode=Mode.SUBTRACT)

    # Sketch18 → Boss-Extrude7 (add, up to next)
    with BuildSketch(Plane(origin=(0, 0, 0), x_dir=(-1, 0, 0), z_dir=(0, 0, -1)), mode=Mode.PRIVATE) as boss_extrude7_sk1:
        with Locations((-48.961920372, 0)):
            Circle(SKETCH18_R)
    boss_extrude7_tool1 = extrude(boss_extrude7_sk1.sketch, amount=BOSS_EXTRUDE7_REACH, mode=Mode.PRIVATE) - part.part
    add(boss_extrude7_tool1.solids().sort_by_distance((48.96192, 0, 0))[0])
    # Sketch18 → Boss-Extrude7 (add, up to next)
    with BuildSketch(Plane(origin=(0, 0, 0), x_dir=(-1, 0, 0), z_dir=(0, 0, -1)), mode=Mode.PRIVATE) as boss_extrude7_sk2:
        with Locations((-11.038079628, 0)):
            Circle(SKETCH18_R)
    boss_extrude7_tool2 = extrude(boss_extrude7_sk2.sketch, amount=BOSS_EXTRUDE7_REACH, mode=Mode.PRIVATE) - part.part
    add(boss_extrude7_tool2.solids().sort_by_distance((11.03808, 0, 0))[0])

    # Sketch19 → Cut-Extrude10 (cut)
    with BuildSketch(Plane.XY):
        with Locations((11.038079628, 0)):
            Circle(SKETCH19_R)
        with Locations((48.961920372, 0)):
            Circle(SKETCH19_R)
    extrude(amount=-CUT_EXTRUDE10_DEPTH, taper=CUT_EXTRUDE10_TAPER, mode=Mode.SUBTRACT)


solid = part.part
